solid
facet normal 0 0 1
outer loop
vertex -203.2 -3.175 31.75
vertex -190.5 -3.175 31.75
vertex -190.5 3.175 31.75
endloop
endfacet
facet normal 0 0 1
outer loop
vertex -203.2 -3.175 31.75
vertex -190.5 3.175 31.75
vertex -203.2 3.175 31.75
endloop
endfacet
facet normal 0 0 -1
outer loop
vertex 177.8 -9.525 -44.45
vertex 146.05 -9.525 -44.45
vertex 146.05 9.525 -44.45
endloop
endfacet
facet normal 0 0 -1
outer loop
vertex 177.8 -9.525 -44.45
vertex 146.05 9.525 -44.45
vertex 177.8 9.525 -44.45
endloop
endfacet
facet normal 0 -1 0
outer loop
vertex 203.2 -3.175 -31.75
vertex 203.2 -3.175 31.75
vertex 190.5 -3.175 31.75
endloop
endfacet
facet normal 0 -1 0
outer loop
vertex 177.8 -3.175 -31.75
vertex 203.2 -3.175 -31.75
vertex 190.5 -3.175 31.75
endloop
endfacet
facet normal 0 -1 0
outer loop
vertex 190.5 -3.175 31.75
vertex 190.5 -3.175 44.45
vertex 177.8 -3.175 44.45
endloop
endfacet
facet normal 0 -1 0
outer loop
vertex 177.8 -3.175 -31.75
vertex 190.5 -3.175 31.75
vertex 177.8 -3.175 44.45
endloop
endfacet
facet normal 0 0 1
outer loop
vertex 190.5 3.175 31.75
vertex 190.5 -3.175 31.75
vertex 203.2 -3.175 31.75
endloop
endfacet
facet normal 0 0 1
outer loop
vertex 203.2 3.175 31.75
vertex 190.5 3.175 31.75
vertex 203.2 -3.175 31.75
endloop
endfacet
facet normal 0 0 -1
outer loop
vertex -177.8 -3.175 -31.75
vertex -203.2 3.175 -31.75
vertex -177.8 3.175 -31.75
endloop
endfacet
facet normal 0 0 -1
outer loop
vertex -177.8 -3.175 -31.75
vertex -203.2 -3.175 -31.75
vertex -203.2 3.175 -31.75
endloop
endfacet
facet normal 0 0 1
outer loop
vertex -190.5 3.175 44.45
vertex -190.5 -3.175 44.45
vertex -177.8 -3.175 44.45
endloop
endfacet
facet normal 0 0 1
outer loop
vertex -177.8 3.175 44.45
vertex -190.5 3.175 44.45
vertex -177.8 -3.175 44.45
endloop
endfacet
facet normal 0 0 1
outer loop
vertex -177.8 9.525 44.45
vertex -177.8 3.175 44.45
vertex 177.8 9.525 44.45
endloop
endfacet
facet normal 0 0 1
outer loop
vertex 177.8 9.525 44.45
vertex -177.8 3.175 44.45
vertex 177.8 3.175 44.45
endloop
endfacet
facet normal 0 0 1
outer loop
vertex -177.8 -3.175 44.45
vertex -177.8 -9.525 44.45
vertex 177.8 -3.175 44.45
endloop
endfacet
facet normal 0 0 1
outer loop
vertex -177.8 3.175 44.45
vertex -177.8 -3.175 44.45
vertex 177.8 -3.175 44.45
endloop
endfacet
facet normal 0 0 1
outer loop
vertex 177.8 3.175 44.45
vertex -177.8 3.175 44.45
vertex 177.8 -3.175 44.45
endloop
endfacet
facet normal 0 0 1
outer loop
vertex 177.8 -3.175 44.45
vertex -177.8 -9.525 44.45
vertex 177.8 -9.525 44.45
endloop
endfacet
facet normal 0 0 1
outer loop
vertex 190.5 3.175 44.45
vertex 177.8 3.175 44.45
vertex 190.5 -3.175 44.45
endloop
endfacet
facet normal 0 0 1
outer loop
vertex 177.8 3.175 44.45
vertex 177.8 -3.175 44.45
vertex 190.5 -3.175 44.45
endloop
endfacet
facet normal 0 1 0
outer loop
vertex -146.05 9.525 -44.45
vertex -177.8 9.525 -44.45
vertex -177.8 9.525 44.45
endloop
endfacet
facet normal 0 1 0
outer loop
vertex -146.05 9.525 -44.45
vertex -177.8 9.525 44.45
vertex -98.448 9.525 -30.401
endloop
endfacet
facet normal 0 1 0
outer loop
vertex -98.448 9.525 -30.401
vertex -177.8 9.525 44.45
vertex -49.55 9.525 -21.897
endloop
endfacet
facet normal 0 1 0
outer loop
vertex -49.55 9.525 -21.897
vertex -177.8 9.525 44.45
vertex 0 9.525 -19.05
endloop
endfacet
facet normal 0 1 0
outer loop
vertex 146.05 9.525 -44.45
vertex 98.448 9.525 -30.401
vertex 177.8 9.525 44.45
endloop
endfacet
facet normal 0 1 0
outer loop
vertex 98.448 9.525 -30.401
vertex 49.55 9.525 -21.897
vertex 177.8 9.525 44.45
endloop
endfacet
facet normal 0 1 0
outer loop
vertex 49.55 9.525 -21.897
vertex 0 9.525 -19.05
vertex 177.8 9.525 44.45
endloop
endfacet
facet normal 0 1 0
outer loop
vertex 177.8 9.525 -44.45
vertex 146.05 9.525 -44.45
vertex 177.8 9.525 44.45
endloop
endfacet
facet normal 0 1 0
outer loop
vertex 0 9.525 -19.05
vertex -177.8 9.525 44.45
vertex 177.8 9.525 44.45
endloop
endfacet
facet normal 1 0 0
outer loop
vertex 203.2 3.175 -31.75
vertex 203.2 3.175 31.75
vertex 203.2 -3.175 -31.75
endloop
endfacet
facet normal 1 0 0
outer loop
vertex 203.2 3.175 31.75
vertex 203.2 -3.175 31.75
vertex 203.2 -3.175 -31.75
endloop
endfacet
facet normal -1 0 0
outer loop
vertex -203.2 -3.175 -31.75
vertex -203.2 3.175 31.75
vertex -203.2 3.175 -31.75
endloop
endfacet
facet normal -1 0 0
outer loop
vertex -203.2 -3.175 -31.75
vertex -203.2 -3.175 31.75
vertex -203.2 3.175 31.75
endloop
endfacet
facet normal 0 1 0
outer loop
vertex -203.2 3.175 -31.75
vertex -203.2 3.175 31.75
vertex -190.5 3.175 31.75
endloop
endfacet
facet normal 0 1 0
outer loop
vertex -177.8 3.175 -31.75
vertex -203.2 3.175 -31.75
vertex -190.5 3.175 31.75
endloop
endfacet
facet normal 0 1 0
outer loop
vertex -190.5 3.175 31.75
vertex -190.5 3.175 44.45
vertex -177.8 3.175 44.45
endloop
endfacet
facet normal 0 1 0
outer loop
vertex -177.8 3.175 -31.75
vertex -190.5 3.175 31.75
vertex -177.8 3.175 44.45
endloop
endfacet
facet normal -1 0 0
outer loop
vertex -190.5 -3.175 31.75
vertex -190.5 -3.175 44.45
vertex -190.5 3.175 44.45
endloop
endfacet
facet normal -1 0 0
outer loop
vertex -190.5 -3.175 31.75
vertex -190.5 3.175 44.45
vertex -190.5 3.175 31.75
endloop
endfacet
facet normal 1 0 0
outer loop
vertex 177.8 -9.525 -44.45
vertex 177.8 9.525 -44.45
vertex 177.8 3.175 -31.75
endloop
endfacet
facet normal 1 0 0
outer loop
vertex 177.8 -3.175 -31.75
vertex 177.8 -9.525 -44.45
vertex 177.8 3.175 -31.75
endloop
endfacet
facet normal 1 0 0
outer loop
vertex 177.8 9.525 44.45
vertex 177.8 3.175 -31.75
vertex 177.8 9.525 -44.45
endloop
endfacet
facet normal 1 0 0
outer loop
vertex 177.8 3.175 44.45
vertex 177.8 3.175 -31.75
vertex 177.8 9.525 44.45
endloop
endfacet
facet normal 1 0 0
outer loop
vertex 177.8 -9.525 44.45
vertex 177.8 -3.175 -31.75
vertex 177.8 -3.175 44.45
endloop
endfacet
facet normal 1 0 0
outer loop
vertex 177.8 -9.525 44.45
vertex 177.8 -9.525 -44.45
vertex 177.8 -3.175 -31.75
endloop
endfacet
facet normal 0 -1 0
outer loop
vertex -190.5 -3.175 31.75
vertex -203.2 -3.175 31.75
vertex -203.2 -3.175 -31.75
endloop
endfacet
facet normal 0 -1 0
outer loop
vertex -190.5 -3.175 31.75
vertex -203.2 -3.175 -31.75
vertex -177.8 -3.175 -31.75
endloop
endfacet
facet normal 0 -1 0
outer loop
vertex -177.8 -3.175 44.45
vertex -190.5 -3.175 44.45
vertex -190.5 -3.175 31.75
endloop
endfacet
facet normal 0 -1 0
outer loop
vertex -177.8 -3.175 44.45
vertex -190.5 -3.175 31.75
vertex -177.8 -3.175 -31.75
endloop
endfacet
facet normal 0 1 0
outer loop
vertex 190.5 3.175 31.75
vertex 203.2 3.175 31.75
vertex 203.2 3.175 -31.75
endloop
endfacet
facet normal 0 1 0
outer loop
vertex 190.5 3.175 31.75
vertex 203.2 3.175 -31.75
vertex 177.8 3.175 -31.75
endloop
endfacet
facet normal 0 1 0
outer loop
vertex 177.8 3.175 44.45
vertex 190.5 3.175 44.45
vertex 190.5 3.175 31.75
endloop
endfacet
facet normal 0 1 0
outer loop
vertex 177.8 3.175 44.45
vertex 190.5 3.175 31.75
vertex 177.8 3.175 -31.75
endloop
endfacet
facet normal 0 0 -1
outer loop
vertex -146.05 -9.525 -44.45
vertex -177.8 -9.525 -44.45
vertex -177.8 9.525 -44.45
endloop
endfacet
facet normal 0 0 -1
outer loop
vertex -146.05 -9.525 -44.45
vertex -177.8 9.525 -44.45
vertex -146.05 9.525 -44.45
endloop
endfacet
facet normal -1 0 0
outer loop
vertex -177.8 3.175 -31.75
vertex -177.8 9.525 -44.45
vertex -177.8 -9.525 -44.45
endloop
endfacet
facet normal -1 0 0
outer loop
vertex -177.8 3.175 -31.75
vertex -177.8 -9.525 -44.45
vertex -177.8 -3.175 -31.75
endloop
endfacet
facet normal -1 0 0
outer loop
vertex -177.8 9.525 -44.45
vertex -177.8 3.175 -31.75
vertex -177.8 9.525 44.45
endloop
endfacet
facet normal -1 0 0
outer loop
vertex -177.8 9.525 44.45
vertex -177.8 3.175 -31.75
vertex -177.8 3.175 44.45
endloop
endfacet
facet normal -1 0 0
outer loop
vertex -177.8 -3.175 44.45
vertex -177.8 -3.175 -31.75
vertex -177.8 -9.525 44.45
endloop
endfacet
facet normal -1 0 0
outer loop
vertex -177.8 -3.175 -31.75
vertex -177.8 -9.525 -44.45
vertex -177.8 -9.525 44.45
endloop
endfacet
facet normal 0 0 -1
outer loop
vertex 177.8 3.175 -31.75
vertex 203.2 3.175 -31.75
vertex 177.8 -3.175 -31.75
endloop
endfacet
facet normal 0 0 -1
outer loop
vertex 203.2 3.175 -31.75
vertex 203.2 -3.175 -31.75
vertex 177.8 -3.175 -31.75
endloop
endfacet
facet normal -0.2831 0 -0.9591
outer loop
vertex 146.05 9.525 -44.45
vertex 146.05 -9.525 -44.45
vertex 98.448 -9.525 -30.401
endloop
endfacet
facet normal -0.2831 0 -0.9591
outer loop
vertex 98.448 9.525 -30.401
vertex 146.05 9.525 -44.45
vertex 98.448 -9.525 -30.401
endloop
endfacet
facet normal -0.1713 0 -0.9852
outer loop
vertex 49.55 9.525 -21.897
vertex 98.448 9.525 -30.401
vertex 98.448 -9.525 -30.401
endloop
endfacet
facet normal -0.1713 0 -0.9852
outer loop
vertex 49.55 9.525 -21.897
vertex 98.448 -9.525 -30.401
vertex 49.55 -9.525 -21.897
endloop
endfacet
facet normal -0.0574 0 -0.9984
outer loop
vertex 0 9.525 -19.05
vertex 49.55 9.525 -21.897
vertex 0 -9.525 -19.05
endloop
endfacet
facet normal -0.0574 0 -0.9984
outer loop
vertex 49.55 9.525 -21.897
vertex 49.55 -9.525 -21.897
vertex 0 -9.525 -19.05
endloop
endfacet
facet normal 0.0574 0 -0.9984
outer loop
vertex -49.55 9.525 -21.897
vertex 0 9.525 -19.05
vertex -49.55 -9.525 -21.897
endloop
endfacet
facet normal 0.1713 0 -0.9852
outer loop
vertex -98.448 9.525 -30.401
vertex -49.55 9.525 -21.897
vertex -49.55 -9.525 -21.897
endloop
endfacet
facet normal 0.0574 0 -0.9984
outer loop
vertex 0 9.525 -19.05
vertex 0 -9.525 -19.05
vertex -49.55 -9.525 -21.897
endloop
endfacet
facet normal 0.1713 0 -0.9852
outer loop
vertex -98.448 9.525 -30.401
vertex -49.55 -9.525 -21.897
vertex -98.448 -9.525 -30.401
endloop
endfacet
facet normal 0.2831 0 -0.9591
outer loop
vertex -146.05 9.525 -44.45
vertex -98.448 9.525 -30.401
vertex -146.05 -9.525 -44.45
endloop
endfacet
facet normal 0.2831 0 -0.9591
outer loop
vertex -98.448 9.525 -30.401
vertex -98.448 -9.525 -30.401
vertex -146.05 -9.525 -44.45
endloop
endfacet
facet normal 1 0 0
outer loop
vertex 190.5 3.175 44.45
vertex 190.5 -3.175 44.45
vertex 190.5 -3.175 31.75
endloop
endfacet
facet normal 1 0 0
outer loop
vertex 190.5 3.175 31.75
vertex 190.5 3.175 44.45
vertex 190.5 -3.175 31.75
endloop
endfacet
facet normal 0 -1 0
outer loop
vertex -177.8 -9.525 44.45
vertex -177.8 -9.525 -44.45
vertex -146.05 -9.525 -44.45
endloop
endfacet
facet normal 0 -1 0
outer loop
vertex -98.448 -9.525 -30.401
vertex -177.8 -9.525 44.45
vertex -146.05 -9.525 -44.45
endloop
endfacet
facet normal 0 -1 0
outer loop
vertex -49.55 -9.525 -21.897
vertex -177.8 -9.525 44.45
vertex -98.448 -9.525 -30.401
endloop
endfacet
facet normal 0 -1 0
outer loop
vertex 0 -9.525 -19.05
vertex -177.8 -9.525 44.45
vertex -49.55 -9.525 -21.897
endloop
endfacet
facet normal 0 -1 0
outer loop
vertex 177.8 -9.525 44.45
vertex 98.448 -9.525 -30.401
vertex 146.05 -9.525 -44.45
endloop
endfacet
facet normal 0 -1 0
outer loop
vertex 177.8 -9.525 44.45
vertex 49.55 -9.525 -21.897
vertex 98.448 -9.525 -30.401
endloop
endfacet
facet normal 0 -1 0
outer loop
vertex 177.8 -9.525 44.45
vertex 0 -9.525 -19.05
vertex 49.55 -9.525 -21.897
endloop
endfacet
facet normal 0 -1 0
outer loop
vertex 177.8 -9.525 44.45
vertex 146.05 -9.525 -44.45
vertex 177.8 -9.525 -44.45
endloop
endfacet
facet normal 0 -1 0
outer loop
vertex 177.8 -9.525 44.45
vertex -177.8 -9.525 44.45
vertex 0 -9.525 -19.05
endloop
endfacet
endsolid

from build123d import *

# Parameters (mm, degrees)
F0_W     = 355.6
F0_H     = 88.9
F1_DEPTH = 9.525
F3_DEPTH = 3.175
F5_DEPTH = 19.05


# Not quite as in the source:
# - a pattern or mirror of a feature is missing from the dataset's text; its kind, count and spacing are read off the source's solid


with BuildPart() as f1:
    # F0 (on Front) → F1 (new body, symmetric)
    with BuildSketch(Plane.XZ):
        Rectangle(F0_W, F0_H)
    extrude(amount=F1_DEPTH, both=True)

    # F2 (on Front) → F3 (join, symmetric)
    with BuildSketch(Plane.XZ):
        Polygon((-177.8, -31.75), (-177.8, 44.45), (-190.5, 44.45), (-190.5, 31.75), (-203.2, 31.75), (-203.2, -31.75), align=None)
    f3 = extrude(amount=F3_DEPTH, both=True)

    # F3_copies: F3 across plane
    add(f3.mirror(Plane(origin=(0, 0, 0), x_dir=(0, 0, 1), z_dir=(1, 0, 0))))

    # F4 (on face) → F5 (cut, through all)
    with BuildSketch(Plane.XZ.offset(9.525)):
        with BuildLine():
            ThreePointArc((146.05, -44.45), (0, -19.05), (-146.05, -44.45))
            Line((-146.05, -44.45), (146.05, -44.45))
        make_face()
    extrude(amount=-F5_DEPTH, mode=Mode.SUBTRACT)


solid = f1.part
